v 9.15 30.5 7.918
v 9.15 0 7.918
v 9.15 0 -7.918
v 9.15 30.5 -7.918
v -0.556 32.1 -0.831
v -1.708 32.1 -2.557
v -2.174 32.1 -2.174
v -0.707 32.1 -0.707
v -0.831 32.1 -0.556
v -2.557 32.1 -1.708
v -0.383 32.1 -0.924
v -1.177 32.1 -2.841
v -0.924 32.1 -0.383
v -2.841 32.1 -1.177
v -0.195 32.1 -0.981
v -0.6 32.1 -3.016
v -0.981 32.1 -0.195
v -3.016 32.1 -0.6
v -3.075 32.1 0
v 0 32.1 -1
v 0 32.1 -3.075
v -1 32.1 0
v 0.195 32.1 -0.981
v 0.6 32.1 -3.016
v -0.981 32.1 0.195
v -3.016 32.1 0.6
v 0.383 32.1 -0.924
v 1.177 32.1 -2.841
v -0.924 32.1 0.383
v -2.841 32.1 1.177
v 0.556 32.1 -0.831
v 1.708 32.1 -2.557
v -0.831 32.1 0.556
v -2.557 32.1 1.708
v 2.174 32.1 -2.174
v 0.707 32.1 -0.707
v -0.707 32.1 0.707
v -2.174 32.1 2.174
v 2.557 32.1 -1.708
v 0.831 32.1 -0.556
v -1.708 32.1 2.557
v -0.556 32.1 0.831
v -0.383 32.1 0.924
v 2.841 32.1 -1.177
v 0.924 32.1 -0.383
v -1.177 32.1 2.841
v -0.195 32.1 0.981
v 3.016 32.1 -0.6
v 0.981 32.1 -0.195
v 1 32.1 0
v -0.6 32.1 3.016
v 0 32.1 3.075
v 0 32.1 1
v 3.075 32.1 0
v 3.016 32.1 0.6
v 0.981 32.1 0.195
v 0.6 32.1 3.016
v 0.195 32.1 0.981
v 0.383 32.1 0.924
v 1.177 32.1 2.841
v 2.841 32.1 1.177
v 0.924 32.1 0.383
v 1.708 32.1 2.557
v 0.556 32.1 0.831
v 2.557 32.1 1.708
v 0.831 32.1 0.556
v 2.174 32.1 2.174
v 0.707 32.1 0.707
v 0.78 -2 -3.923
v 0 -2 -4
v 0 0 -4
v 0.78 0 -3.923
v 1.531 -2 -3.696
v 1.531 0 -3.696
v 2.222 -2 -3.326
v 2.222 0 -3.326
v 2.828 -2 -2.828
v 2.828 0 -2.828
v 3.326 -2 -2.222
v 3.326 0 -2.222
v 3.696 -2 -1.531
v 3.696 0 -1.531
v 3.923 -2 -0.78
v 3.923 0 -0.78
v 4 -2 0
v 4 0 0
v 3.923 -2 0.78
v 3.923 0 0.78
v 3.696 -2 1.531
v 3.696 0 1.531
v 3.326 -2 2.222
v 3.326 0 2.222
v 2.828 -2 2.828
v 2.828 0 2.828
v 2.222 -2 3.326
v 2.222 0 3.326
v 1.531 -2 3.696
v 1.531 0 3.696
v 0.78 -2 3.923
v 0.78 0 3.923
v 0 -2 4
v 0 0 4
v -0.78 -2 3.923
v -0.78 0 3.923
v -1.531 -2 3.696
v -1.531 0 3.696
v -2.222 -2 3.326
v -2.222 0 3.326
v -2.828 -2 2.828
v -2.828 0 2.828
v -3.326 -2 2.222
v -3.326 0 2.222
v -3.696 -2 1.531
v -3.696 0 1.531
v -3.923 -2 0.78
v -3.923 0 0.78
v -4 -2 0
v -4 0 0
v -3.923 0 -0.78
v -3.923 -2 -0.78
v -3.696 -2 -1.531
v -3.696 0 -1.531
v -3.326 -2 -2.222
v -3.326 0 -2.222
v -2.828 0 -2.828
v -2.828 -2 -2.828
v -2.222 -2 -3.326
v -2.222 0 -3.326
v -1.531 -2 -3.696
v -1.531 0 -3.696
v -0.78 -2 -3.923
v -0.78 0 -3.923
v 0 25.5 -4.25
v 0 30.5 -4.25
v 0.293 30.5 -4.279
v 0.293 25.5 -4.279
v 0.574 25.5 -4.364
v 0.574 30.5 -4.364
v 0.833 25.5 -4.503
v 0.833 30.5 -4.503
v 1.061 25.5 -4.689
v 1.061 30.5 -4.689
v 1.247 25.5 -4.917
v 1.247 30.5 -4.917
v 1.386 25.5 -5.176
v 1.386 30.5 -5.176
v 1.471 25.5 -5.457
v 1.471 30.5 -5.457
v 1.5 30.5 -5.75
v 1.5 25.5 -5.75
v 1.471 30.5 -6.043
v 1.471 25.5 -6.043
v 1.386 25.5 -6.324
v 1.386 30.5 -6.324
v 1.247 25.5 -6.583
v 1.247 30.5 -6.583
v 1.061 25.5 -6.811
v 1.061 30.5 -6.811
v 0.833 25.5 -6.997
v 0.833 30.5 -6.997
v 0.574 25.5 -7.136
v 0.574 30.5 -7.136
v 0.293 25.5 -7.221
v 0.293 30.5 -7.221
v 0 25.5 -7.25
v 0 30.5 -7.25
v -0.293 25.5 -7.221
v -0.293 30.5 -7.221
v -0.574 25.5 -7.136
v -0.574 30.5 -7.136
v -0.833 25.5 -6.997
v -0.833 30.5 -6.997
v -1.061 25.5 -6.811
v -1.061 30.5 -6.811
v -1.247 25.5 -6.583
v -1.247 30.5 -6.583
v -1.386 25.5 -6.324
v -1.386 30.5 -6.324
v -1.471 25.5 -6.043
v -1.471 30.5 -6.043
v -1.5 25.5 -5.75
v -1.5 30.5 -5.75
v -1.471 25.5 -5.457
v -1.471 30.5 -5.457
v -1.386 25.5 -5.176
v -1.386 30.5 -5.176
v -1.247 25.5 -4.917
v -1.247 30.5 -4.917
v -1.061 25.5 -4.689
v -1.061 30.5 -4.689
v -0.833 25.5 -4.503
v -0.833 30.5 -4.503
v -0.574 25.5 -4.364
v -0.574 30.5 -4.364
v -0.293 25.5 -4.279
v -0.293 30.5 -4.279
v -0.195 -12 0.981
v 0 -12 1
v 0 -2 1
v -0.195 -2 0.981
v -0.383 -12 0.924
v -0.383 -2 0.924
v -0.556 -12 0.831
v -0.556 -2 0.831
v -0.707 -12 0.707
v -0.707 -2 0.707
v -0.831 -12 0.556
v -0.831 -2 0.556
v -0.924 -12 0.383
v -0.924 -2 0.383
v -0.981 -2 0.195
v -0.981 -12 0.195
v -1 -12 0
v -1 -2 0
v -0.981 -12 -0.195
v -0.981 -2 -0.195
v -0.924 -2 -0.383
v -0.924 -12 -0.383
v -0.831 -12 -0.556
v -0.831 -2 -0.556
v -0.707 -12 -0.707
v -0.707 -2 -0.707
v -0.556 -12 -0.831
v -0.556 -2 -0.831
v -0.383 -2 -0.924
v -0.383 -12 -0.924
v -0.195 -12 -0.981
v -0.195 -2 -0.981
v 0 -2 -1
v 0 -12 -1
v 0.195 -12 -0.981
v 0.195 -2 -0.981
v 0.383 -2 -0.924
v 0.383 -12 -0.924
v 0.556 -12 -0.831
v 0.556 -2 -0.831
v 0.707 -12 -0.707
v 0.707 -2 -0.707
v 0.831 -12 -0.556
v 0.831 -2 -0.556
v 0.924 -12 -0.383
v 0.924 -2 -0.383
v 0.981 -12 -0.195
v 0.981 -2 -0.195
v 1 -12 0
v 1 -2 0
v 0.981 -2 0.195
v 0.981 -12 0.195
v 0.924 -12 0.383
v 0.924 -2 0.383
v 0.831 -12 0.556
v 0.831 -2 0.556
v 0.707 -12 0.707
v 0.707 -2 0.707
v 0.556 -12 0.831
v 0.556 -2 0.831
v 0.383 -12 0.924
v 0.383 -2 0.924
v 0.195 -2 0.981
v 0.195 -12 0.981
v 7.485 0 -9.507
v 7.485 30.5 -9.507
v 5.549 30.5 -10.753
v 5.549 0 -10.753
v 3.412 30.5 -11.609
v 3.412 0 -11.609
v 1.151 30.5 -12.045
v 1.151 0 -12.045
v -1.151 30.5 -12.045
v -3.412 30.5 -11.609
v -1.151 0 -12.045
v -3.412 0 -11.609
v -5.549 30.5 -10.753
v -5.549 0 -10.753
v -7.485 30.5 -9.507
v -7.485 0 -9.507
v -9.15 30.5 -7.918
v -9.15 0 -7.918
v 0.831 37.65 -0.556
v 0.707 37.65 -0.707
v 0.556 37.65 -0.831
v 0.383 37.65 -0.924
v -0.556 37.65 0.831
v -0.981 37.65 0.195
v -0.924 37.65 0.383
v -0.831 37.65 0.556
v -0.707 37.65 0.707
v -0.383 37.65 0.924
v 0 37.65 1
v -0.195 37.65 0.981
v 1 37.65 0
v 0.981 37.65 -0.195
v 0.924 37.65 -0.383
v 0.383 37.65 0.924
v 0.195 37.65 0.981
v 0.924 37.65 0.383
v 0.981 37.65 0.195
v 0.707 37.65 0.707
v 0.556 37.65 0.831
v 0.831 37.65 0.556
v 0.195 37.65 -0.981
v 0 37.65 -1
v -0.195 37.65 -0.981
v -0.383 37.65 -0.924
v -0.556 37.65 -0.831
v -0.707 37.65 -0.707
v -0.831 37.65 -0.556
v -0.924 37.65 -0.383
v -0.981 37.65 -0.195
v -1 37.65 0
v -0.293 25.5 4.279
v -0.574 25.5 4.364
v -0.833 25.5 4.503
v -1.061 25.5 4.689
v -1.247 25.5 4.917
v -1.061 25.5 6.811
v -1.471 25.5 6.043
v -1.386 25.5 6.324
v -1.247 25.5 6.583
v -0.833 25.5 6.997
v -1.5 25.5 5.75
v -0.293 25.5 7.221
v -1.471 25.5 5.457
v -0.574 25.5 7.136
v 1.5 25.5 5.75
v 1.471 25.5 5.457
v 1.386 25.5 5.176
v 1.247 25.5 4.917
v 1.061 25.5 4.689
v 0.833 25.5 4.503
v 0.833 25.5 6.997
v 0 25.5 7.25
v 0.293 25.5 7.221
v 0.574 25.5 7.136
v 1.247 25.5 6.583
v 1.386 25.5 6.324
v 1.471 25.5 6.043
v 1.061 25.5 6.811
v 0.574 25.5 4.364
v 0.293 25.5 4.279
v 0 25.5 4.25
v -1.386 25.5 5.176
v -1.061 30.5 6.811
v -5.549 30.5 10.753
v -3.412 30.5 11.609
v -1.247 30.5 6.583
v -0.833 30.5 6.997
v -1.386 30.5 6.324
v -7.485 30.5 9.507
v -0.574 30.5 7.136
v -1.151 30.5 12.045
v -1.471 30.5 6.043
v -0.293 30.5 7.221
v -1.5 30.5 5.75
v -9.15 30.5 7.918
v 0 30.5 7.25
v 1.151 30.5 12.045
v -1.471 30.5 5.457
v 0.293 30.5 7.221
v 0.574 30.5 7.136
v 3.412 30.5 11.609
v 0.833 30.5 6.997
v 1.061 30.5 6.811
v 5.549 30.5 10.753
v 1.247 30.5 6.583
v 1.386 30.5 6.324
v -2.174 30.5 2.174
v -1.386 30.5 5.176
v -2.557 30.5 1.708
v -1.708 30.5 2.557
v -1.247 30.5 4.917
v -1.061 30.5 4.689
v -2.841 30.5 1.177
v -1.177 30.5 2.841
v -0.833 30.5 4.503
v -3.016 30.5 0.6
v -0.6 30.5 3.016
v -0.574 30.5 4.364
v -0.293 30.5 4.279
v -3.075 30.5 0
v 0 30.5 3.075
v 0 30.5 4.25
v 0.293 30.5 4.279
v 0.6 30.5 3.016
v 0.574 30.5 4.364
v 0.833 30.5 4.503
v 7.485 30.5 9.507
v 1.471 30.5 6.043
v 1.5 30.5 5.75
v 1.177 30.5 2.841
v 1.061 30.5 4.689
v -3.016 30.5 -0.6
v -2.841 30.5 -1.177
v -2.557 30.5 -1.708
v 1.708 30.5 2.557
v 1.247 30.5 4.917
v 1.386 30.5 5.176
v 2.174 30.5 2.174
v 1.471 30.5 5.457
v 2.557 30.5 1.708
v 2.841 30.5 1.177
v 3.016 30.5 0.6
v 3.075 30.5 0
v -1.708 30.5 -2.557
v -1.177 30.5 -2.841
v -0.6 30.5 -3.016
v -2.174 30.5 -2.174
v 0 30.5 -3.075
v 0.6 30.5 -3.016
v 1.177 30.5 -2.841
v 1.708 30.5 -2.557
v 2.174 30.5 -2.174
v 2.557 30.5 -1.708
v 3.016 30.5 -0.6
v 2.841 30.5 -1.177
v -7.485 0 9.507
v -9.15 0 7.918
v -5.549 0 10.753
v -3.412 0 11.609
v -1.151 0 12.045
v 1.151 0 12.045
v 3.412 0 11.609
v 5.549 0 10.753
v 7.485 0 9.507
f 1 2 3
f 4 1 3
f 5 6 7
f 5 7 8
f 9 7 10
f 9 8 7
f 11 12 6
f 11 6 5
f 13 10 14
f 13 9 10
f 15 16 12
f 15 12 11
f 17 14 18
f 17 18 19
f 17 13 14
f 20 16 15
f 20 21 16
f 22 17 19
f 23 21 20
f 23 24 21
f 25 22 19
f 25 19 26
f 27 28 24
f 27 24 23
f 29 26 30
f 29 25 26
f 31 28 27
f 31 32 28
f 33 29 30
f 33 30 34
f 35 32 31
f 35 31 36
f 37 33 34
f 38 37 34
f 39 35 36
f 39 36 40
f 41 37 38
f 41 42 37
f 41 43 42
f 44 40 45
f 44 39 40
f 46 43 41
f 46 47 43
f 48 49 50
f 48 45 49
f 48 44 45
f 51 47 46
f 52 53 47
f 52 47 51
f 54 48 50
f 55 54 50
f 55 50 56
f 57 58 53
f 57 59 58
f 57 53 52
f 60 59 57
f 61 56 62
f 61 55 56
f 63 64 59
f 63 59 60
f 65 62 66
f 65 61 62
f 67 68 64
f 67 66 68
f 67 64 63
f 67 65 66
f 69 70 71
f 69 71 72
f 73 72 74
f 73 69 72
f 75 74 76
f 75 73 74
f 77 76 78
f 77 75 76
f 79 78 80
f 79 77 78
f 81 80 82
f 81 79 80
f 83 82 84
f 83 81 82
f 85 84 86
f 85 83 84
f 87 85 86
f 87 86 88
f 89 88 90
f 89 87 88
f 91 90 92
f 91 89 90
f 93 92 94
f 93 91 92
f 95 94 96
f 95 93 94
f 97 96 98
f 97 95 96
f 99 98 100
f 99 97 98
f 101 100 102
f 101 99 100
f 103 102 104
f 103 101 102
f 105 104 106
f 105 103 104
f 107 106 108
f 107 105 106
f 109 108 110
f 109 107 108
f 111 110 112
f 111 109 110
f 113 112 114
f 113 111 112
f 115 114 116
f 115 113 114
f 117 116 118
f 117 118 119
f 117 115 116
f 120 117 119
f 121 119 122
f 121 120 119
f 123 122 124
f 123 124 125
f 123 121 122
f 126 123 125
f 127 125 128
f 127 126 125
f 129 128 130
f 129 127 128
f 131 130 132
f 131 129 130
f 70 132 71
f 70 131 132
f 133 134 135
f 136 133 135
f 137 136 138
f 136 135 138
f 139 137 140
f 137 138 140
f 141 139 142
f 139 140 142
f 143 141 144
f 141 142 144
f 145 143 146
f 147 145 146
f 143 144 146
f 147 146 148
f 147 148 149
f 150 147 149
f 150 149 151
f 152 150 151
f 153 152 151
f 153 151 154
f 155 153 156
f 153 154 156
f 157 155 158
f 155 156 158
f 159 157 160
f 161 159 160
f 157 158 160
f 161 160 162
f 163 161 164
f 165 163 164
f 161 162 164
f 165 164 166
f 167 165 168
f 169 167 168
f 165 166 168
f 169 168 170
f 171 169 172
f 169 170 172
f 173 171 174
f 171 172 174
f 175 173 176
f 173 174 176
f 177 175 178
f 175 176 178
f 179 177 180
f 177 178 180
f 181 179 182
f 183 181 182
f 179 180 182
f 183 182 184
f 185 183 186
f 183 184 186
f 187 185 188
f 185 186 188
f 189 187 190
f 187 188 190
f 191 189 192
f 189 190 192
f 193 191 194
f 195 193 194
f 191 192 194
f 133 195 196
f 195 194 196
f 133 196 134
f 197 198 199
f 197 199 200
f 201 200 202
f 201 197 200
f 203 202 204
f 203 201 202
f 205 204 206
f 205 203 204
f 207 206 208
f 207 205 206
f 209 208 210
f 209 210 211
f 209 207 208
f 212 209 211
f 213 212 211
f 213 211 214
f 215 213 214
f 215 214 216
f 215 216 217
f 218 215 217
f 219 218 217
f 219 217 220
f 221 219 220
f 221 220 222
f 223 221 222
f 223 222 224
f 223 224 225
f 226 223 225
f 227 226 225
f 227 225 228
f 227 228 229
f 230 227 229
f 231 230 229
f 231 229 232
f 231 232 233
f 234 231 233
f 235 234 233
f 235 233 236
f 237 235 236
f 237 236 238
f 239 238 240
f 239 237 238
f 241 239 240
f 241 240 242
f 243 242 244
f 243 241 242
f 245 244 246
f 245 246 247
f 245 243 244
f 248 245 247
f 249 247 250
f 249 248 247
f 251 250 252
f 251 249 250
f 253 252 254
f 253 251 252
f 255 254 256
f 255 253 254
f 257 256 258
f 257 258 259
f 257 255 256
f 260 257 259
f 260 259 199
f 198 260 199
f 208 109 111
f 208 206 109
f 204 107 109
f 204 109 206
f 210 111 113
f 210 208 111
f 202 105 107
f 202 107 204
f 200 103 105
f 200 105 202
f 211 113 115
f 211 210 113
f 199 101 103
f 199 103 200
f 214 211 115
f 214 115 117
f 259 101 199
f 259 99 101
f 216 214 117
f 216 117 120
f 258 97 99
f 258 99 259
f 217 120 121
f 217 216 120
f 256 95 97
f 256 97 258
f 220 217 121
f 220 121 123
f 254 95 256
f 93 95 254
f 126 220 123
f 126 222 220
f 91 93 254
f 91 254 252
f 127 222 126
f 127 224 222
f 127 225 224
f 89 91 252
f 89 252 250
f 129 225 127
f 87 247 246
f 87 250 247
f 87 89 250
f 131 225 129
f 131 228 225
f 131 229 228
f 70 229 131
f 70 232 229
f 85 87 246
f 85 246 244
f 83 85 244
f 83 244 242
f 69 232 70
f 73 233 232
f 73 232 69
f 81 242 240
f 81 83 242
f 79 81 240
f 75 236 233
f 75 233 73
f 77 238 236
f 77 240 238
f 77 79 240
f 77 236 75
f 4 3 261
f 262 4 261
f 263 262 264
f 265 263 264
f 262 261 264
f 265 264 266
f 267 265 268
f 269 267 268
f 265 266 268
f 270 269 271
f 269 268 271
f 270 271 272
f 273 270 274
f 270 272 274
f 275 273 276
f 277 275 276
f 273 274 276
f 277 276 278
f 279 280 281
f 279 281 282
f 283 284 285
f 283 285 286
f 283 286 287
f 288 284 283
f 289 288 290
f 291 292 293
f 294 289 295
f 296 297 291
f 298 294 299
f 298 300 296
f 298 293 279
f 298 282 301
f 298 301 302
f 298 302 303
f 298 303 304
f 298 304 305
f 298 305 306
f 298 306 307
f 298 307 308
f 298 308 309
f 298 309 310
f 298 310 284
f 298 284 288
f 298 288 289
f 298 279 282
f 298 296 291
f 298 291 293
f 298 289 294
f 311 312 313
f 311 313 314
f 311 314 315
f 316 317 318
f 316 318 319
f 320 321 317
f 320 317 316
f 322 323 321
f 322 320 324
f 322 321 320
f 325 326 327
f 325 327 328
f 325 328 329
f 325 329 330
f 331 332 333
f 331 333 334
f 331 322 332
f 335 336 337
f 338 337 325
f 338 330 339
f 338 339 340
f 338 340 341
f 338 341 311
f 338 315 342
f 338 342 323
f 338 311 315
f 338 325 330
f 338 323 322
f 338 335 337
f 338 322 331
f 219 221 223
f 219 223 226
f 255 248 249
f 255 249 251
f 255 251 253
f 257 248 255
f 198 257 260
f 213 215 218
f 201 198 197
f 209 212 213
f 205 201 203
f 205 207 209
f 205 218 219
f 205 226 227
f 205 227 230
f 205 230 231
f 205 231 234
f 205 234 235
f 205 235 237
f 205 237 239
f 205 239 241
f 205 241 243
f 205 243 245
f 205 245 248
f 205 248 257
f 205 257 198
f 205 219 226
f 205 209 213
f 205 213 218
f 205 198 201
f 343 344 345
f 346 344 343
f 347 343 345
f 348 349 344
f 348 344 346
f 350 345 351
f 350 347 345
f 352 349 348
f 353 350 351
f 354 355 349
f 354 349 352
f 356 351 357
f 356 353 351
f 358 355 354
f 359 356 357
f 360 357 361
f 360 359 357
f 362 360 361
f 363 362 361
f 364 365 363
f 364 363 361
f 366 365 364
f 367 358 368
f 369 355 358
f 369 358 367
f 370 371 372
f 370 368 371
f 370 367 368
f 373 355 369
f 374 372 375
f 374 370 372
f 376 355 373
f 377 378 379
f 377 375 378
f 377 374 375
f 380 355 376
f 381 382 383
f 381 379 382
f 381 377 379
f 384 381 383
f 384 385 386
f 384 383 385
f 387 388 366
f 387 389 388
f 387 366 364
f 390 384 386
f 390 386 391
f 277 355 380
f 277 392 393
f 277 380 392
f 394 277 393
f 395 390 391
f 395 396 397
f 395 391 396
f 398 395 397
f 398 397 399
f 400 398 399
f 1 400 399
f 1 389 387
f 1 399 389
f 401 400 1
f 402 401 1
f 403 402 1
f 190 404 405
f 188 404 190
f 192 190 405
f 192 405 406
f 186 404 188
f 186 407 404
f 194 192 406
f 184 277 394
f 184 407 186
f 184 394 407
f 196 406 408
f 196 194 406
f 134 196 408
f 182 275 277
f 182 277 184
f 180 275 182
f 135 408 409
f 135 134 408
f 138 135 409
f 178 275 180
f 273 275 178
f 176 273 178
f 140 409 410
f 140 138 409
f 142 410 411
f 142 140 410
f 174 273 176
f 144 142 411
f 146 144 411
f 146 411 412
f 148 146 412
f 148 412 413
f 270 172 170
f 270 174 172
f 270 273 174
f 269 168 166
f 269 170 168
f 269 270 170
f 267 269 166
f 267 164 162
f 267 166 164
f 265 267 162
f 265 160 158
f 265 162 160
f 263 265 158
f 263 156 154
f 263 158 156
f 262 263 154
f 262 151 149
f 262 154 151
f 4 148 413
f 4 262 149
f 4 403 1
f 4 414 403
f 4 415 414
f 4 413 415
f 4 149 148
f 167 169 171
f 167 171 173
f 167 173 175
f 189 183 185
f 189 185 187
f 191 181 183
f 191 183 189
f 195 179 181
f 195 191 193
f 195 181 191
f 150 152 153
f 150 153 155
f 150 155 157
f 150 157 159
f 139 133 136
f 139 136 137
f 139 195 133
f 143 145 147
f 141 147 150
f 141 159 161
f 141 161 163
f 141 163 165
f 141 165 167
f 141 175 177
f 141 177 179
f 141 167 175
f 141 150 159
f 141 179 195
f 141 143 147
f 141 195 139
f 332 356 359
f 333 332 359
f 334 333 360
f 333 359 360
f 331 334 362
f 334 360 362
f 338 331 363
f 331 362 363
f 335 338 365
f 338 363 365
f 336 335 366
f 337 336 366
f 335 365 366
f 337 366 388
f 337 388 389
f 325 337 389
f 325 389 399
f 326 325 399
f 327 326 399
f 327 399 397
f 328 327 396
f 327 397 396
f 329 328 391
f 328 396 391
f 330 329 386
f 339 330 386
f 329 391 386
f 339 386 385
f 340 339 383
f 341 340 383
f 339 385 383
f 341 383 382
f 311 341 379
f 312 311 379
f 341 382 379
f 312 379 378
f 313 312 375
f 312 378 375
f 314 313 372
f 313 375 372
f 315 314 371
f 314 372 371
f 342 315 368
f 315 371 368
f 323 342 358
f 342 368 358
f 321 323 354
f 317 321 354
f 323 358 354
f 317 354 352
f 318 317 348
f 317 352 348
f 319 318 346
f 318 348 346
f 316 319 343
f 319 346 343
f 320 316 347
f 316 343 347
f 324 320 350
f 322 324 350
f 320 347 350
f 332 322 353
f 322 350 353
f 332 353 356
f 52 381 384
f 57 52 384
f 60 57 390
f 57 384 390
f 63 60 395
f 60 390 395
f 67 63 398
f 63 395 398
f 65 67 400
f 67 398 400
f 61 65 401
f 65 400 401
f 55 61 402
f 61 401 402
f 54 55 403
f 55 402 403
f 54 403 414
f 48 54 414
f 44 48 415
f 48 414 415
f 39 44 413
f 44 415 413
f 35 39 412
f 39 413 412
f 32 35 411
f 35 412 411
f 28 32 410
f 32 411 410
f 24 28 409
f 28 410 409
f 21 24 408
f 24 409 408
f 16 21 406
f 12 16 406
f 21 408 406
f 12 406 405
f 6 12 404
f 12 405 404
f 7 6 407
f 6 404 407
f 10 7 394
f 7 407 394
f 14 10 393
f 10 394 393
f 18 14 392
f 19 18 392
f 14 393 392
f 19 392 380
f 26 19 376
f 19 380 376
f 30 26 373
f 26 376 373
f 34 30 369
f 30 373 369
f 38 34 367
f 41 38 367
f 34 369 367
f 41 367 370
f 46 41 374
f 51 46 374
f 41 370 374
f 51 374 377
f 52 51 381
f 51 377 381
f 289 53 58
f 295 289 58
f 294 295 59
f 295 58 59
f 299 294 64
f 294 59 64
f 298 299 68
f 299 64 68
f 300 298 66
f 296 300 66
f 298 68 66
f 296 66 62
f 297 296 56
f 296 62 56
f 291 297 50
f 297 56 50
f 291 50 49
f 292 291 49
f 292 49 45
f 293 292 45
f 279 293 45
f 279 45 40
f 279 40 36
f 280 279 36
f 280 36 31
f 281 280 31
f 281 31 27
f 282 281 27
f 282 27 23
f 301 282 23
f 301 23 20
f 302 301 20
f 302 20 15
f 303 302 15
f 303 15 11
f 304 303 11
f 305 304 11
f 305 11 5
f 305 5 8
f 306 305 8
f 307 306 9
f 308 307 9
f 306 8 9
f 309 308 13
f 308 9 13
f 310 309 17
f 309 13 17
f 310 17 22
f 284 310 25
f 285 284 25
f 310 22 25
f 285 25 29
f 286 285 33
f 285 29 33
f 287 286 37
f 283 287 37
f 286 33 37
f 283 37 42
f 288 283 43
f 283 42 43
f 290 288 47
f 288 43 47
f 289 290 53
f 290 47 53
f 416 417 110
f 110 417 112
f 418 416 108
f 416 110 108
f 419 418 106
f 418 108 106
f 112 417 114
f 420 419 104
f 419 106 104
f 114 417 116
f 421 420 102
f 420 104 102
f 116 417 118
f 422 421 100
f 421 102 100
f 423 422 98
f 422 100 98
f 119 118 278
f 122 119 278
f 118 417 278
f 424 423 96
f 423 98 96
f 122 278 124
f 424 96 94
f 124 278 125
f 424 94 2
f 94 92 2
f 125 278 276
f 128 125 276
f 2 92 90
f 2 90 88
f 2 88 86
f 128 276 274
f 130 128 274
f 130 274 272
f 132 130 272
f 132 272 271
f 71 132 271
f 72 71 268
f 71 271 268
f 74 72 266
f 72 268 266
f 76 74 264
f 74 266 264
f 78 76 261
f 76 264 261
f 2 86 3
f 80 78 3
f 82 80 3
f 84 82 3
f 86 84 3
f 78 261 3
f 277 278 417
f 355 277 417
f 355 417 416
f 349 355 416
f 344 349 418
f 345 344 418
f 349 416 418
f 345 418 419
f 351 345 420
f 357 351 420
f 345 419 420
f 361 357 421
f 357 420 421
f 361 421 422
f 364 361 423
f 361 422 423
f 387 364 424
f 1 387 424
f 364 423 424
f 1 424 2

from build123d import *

# Parameters (mm, degrees)
BOSS_EXTRUDE1_DEPTH = 30.5
SKETCH2_R           = 3.075
SKETCH2_R_2         = 1
BOSS_EXTRUDE2_DEPTH = 1.6
SKETCH2_2_R         = 1
BOSS_EXTRUDE3_DEPTH = 7.15
BOSS_EXTRUDE4_START = 2
SKETCH3_R           = 4
SKETCH3_R_2         = 1
BOSS_EXTRUDE4_DEPTH = 2
BOSS_EXTRUDE5_START = 12
SKETCH3_2_R         = 1
BOSS_EXTRUDE5_DEPTH = 12
SKETCH4_R           = 1.5
CUT_EXTRUDE1_DEPTH  = 5


with BuildPart() as part:
    # Sketch1 → Boss-Extrude1 (new body)
    with BuildSketch(Plane(origin=(0, 0, 0), x_dir=(1, 0, 0), z_dir=(0, 1, 0))):
        with BuildLine():
            Line((-9.15, 7.917543811), (-9.15, -7.917543811))
            ThreePointArc((-9.15, -7.917543811), (0, -12.1), (9.15, -7.917543811))
            Line((9.15, -7.917543811), (9.15, 7.917543811))
            ThreePointArc((9.15, 7.917543811), (0, 12.1), (-9.15, 7.917543811))
        make_face()
    extrude(amount=BOSS_EXTRUDE1_DEPTH)

    # Sketch2 → Boss-Extrude2 (add)
    with BuildSketch(Plane(origin=(0, 30.5, 0), x_dir=(1, 0, 0), z_dir=(0, 1, 0))):
        Circle(SKETCH2_R)
        Circle(SKETCH2_R_2, mode=Mode.SUBTRACT)
    extrude(amount=BOSS_EXTRUDE2_DEPTH)

    # Sketch2<2> → Boss-Extrude3 (add)
    with BuildSketch(Plane(origin=(0, 30.5, 0), x_dir=(1, 0, 0), z_dir=(0, 1, 0))):
        Circle(SKETCH2_2_R)
    extrude(amount=BOSS_EXTRUDE3_DEPTH)

    # Sketch3 → Boss-Extrude4 (add)
    with BuildSketch(Plane.XZ.offset(BOSS_EXTRUDE4_START)):
        Circle(SKETCH3_R)
        Circle(SKETCH3_R_2, mode=Mode.SUBTRACT)
    extrude(amount=-BOSS_EXTRUDE4_DEPTH)

    # Sketch3<2> → Boss-Extrude5 (add)
    with BuildSketch(Plane.XZ.offset(BOSS_EXTRUDE5_START)):
        Circle(SKETCH3_2_R)
    extrude(amount=-BOSS_EXTRUDE5_DEPTH)

    # Sketch4 → Cut-Extrude1 (cut)
    with BuildSketch(Plane(origin=(0, 30.5, 0), x_dir=(1, 0, 0), z_dir=(0, 1, 0))):
        with Locations((0, 5.75)):
            Circle(SKETCH4_R)
        with Locations((0, -5.75)):
            Circle(SKETCH4_R)
    extrude(amount=-CUT_EXTRUDE1_DEPTH, mode=Mode.SUBTRACT)


solid = part.part
